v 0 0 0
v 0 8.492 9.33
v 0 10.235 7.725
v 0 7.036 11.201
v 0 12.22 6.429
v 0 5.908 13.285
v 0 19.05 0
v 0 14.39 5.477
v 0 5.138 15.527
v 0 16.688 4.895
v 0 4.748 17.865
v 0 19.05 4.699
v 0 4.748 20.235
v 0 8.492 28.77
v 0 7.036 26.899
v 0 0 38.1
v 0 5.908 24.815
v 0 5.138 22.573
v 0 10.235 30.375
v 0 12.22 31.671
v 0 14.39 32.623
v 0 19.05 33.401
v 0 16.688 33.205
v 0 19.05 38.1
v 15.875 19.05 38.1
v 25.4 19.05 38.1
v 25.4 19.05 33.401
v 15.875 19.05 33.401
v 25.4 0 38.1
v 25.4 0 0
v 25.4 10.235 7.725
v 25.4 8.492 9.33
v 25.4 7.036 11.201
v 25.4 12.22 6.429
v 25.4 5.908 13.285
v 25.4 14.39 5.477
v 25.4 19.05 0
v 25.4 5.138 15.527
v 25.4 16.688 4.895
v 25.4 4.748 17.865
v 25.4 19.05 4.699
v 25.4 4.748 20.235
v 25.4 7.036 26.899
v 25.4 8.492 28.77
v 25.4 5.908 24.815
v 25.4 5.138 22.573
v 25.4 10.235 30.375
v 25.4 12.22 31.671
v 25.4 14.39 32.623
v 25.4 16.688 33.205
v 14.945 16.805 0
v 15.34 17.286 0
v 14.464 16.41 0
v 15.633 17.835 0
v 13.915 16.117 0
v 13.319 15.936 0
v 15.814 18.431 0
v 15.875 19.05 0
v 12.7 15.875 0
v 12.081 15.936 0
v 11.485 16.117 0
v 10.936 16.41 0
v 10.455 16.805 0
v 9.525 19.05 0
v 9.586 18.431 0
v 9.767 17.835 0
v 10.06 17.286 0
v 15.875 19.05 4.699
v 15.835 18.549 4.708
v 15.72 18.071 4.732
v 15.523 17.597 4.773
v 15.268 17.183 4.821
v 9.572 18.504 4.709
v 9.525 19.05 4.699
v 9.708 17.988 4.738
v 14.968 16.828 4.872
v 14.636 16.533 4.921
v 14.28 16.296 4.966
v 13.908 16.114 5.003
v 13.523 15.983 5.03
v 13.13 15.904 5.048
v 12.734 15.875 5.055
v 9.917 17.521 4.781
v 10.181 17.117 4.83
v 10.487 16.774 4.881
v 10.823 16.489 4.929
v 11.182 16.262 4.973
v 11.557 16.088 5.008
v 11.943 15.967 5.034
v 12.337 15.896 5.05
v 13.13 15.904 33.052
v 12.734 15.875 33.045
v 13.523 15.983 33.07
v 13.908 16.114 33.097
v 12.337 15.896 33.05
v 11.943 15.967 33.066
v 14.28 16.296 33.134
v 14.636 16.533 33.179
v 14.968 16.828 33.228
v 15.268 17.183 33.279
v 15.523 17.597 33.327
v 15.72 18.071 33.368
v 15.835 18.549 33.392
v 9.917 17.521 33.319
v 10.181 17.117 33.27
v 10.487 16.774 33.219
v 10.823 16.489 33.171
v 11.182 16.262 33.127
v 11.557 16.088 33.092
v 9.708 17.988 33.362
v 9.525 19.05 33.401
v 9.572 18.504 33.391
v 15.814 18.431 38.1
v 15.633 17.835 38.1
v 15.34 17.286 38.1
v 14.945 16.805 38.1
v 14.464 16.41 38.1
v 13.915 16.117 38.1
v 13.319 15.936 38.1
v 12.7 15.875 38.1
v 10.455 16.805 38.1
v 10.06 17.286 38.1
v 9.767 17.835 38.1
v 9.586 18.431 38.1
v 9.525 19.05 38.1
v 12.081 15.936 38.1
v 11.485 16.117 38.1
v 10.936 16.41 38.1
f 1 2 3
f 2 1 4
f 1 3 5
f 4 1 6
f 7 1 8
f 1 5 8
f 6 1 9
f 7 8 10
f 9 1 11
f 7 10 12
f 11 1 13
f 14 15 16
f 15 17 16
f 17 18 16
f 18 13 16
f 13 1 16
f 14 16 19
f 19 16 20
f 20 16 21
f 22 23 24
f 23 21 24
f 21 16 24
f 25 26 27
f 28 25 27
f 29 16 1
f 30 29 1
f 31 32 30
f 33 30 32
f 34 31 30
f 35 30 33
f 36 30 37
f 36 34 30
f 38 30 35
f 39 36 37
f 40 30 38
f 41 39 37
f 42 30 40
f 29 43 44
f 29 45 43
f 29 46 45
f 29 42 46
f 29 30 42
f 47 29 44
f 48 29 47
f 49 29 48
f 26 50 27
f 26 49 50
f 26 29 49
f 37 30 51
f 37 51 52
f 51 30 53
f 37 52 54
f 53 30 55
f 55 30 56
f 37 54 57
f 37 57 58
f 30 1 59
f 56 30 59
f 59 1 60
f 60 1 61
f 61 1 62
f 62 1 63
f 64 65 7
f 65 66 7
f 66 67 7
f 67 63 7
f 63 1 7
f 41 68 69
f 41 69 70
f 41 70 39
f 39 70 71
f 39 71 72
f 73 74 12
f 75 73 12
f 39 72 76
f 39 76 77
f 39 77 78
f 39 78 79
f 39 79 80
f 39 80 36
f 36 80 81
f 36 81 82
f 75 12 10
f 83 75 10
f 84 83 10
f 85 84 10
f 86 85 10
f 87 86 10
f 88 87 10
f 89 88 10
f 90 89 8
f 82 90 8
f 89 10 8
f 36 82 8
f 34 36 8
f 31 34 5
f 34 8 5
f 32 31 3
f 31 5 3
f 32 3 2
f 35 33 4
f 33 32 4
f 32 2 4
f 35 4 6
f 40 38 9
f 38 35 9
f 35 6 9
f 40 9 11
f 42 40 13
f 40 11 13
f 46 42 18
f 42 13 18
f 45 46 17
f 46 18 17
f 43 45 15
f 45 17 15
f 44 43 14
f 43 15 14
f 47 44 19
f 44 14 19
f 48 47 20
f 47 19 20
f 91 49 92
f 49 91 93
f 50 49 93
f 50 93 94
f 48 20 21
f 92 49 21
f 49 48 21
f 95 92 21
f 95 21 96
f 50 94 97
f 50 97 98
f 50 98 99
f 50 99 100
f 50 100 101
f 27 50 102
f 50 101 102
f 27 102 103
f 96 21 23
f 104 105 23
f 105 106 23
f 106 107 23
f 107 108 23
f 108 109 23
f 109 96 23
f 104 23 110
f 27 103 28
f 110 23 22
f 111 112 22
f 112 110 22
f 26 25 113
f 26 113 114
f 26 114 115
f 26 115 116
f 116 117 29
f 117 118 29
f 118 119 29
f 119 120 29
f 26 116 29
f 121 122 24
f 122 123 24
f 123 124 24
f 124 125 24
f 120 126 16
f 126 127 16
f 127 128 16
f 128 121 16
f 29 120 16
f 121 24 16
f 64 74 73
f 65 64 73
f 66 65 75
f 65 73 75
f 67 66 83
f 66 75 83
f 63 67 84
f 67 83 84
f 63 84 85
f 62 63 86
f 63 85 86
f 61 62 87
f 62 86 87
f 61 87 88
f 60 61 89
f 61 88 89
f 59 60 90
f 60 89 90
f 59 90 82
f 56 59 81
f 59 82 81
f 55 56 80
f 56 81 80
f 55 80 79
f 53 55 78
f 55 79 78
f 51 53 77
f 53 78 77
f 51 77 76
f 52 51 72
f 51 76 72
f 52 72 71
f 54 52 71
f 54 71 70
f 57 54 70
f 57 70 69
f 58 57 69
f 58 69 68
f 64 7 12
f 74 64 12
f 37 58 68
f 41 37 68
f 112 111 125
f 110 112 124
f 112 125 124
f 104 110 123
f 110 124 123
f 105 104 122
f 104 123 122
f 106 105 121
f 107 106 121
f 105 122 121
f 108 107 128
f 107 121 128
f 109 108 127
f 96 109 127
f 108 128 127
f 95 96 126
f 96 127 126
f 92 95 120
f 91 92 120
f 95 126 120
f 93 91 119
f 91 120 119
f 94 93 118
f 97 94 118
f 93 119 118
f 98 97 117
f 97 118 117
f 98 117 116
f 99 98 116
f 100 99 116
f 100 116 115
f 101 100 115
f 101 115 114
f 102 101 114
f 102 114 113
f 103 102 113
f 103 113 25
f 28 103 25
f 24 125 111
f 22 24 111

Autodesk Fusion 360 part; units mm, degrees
sketch "Sketch1" plane through (0, 0, 0) normal (1, 0, 0) x (0, 1, 0)
  line L0 (19.05, 38.1) -> (0, 38.1)
  line L1 (0, 38.1) -> (0, 0)
  line L2 (0, 0) -> (19.05, 0)
  line L3 (19.05, 0) -> (19.05, 4.699)
  line L4 (19.05, 38.1) -> (19.05, 33.401)
  line L5 (19.05, 33.401) -> (19.05, 4.699) construction
  arc A0 (19.05, 33.401) -> (19.05, 4.699) centre (19.05, 19.05) ccw
  dimension "d1" = 14.351
  dimension "d3" = 19.05
  dimension "d4" = 38.1
extrude "Extrude1" add sketch "Sketch1" along normal blind 25.4
sketch "Sketch2" plane through (0, 0, 38.1) normal (0, 0, 1) x (-1, 0, 0)
  line L0 (0, -19.05) -> (0, 0)
  line L1 (0, 0) -> (-25.4, 0)
  line L2 (-25.4, 0) -> (-25.4, -19.05)
  line L3 (-25.4, -19.05) -> (0, -19.05)
  circle A0 centre (-12.7, -19.05) radius 3.175
  dimension "d7" = 6.35
extrude "Extrude2" cut sketch "Sketch2" against normal up to surface (38.1 mm away) contours L3 A0 | L3 A0
